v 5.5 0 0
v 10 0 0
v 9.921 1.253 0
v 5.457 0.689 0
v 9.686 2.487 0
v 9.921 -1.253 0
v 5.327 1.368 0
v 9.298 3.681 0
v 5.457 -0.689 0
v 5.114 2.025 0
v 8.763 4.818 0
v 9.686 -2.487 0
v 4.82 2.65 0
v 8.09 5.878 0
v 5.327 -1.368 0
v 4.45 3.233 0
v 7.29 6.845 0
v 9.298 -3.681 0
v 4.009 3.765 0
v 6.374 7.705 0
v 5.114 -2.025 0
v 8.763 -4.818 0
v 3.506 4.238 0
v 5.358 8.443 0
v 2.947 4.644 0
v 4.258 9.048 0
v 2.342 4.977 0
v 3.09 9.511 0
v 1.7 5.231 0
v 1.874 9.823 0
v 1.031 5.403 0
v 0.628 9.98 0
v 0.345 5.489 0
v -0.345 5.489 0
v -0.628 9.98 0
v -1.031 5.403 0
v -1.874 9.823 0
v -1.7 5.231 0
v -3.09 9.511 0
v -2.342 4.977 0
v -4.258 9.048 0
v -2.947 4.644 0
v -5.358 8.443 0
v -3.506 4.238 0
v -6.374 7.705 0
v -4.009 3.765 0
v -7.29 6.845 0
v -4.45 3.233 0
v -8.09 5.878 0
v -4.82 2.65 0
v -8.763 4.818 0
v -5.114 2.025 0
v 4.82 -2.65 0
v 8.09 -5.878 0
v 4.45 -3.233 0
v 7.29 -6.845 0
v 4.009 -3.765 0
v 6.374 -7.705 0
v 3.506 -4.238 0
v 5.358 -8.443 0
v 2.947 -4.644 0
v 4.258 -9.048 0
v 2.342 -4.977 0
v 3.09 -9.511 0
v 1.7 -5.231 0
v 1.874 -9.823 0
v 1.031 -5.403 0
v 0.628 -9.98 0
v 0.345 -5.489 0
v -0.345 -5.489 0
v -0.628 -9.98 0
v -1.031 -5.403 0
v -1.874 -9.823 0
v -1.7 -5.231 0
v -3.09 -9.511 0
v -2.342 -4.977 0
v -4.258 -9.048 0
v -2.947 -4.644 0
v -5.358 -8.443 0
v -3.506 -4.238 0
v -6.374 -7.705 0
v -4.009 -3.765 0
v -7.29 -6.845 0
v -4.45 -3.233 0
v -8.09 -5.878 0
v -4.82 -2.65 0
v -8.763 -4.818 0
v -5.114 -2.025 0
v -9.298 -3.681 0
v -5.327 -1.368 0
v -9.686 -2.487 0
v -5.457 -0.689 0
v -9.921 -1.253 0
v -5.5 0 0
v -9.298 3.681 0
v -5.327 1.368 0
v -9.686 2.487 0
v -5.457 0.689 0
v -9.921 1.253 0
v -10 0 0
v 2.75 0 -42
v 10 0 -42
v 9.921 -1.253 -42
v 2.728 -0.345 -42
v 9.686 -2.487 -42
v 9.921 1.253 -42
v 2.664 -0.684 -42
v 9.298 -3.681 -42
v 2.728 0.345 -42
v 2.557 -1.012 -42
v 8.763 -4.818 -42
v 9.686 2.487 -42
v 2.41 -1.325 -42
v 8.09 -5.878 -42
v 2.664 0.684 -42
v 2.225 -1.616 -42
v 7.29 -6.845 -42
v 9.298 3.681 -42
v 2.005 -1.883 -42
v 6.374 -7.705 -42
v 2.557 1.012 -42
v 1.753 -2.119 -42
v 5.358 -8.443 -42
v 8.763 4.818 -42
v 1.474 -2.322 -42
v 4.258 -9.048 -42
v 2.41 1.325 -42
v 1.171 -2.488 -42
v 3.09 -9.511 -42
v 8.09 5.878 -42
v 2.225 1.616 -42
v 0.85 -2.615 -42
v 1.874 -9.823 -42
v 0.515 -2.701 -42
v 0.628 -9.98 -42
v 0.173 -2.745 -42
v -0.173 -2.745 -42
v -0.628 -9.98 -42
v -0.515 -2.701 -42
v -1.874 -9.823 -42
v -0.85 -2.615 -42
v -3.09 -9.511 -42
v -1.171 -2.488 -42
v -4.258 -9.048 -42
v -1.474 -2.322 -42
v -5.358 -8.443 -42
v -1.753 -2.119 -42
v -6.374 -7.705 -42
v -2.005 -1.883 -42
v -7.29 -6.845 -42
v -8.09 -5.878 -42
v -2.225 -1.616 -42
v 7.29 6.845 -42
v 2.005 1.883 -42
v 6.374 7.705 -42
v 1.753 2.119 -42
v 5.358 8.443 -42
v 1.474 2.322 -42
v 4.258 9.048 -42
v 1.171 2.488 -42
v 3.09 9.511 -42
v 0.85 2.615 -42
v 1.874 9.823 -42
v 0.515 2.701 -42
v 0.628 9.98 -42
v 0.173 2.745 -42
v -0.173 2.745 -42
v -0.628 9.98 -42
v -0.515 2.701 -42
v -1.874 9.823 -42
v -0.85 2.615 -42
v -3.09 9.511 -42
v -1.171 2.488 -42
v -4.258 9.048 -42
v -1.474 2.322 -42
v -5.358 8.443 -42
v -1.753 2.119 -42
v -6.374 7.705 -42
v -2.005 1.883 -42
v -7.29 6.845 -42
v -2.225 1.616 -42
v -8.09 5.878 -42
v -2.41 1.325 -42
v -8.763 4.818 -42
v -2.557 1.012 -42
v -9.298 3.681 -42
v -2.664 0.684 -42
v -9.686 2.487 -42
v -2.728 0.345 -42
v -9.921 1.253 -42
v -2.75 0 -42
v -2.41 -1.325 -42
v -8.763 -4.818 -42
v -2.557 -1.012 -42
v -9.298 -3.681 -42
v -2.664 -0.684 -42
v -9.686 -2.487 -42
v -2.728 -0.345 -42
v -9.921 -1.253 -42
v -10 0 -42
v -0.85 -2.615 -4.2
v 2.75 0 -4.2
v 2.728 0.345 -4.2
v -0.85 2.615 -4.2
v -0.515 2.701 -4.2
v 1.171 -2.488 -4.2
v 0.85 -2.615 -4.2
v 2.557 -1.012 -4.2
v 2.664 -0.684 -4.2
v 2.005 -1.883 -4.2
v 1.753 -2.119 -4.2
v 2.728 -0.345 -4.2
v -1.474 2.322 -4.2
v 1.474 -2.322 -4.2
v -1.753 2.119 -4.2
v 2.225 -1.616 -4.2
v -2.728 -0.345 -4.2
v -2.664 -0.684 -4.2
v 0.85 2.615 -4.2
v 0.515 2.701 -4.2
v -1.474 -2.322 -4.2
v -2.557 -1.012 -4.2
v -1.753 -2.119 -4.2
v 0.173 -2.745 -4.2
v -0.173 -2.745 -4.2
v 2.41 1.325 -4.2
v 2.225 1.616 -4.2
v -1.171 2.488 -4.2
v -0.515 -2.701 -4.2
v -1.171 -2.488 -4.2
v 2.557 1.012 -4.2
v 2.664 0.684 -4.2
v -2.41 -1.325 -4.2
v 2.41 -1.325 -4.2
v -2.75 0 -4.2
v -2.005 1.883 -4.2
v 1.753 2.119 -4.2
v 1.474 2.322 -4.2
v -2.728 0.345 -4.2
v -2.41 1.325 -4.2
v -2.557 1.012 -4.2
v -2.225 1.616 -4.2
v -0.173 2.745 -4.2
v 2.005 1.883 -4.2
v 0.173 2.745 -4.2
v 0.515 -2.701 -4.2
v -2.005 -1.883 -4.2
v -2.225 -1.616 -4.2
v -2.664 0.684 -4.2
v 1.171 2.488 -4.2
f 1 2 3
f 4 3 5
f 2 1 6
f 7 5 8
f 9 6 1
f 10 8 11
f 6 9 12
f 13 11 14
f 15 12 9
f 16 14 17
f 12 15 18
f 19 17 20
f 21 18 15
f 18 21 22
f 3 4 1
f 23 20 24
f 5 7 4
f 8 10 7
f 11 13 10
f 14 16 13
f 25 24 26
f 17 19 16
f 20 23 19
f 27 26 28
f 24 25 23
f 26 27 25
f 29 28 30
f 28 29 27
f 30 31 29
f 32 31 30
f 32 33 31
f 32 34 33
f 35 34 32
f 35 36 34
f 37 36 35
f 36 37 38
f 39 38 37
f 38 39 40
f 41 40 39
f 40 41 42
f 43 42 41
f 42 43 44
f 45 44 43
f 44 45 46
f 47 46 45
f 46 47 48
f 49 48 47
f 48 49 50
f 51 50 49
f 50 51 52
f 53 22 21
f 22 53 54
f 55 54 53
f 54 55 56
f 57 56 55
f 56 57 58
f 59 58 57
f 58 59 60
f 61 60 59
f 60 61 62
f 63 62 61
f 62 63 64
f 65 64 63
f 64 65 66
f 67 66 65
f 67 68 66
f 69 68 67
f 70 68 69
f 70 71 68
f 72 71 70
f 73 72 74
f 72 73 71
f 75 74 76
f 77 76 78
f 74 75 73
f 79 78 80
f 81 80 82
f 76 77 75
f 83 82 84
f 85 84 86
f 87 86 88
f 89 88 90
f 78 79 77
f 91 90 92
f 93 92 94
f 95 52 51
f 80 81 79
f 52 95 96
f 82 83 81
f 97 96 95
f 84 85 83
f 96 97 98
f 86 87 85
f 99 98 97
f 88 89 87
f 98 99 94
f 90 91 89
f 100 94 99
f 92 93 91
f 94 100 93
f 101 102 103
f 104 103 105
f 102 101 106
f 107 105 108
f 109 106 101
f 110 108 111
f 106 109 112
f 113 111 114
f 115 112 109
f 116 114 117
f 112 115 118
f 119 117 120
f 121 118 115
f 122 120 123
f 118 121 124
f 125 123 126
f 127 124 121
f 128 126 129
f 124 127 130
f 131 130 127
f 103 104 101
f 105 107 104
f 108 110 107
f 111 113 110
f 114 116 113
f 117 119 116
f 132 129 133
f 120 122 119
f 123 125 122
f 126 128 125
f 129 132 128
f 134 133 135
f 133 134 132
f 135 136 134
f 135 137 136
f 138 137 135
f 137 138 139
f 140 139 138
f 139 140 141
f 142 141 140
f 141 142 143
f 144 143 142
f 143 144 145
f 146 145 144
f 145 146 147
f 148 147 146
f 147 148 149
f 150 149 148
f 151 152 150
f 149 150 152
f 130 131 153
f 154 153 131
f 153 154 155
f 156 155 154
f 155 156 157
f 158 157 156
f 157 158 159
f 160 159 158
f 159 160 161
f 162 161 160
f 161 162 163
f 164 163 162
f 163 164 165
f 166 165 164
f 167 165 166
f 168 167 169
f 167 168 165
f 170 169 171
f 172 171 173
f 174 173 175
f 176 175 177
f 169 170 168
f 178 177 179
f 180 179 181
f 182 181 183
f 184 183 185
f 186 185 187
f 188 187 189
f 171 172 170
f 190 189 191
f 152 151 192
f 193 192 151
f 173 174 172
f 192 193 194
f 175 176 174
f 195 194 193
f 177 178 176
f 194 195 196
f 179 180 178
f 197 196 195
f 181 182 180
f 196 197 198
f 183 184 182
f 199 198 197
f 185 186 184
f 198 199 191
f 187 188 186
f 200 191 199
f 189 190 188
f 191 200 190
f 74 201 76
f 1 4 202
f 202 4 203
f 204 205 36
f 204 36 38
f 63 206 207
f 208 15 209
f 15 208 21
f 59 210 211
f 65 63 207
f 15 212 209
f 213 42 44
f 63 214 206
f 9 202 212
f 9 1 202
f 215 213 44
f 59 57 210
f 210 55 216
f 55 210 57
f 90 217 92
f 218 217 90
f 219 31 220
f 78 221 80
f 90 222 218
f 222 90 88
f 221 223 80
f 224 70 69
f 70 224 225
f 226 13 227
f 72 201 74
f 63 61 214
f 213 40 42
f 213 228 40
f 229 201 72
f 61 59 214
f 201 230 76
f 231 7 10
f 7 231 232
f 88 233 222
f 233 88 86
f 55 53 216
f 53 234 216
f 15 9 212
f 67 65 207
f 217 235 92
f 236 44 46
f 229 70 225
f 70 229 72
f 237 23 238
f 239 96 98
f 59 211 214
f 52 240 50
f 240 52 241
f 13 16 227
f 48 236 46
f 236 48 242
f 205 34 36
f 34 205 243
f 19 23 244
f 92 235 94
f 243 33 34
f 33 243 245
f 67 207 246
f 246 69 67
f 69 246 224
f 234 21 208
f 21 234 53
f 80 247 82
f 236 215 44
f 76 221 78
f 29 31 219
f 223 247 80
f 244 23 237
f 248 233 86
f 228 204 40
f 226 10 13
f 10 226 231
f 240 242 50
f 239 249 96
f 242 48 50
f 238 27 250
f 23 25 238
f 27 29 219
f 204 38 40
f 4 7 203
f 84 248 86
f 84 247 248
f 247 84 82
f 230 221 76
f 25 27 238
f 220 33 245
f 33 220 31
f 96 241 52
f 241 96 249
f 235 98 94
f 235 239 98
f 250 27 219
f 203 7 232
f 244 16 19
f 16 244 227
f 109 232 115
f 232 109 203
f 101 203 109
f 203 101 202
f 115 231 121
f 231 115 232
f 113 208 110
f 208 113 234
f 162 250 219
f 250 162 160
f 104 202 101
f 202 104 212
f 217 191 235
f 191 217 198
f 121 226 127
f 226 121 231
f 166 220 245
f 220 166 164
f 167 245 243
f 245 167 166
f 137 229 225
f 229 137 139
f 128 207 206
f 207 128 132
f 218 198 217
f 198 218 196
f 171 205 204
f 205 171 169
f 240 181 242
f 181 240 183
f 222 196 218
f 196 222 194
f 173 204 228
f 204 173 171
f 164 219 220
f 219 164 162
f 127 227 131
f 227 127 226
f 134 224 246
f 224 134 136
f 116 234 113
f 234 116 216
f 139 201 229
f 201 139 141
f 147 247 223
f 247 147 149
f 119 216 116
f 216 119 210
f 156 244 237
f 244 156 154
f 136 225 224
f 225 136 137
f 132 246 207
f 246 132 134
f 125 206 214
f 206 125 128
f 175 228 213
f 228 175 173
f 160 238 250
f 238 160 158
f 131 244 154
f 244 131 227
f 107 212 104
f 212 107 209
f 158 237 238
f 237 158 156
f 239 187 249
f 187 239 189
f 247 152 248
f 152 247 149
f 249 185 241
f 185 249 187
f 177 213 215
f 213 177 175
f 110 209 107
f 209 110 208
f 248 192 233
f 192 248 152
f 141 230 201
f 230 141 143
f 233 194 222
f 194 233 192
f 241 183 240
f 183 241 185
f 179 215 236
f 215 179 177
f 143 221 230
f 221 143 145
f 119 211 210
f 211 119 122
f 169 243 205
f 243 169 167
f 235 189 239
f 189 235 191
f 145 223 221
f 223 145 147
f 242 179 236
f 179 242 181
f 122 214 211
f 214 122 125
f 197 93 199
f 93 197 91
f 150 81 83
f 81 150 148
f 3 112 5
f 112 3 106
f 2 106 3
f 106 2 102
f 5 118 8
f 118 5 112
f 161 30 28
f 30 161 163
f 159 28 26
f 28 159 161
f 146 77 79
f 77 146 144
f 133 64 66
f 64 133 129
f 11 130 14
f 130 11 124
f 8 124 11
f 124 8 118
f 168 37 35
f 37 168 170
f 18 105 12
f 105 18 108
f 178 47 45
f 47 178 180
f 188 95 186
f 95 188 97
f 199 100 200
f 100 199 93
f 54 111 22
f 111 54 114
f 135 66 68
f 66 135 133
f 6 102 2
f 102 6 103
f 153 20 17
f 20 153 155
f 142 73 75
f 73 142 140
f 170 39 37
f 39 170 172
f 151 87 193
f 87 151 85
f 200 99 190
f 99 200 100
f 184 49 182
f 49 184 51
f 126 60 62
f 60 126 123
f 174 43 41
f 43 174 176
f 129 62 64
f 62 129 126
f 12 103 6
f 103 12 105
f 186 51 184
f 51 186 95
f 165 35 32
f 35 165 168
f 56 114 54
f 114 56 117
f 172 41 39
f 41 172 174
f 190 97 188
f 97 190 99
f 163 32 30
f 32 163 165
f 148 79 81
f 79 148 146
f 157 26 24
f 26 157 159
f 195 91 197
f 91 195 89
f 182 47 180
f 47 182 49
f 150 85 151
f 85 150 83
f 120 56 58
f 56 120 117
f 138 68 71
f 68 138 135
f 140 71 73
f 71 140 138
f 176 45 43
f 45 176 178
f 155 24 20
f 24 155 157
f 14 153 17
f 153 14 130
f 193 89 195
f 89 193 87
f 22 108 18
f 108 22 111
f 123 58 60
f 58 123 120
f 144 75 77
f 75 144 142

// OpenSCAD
$fn = 50;


difference() {
	union() {
		translate(v = [0, 0, -42.0000000000]) {
			cylinder(h = 42, r = 10.0000000000);
		}
		cylinder(h = 0, r = 19.0000000000);
	}
	union() {
		translate(v = [0, 0, 0]) {
			rotate(a = [0, 0, 0]) {
				difference() {
					union() {
						#translate(v = [0, 0, -42.0000000000]) {
							cylinder(h = 42, r = 2.2500000000);
						}
						#translate(v = [0, 0, -4.2000000000]) {
							cylinder(h = 4.2000000000, r = 10.0000000000, r1 = 2.7500000000, r2 = 5.5000000000);
						}
						#translate(v = [0, 0, -42.0000000000]) {
							cylinder(h = 42, r = 2.7500000000);
						}
						#translate(v = [0, 0, -42.0000000000]) {
							cylinder(h = 42, r = 2.2500000000);
						}
					}
					union();
				}
			}
		}
	}
}
